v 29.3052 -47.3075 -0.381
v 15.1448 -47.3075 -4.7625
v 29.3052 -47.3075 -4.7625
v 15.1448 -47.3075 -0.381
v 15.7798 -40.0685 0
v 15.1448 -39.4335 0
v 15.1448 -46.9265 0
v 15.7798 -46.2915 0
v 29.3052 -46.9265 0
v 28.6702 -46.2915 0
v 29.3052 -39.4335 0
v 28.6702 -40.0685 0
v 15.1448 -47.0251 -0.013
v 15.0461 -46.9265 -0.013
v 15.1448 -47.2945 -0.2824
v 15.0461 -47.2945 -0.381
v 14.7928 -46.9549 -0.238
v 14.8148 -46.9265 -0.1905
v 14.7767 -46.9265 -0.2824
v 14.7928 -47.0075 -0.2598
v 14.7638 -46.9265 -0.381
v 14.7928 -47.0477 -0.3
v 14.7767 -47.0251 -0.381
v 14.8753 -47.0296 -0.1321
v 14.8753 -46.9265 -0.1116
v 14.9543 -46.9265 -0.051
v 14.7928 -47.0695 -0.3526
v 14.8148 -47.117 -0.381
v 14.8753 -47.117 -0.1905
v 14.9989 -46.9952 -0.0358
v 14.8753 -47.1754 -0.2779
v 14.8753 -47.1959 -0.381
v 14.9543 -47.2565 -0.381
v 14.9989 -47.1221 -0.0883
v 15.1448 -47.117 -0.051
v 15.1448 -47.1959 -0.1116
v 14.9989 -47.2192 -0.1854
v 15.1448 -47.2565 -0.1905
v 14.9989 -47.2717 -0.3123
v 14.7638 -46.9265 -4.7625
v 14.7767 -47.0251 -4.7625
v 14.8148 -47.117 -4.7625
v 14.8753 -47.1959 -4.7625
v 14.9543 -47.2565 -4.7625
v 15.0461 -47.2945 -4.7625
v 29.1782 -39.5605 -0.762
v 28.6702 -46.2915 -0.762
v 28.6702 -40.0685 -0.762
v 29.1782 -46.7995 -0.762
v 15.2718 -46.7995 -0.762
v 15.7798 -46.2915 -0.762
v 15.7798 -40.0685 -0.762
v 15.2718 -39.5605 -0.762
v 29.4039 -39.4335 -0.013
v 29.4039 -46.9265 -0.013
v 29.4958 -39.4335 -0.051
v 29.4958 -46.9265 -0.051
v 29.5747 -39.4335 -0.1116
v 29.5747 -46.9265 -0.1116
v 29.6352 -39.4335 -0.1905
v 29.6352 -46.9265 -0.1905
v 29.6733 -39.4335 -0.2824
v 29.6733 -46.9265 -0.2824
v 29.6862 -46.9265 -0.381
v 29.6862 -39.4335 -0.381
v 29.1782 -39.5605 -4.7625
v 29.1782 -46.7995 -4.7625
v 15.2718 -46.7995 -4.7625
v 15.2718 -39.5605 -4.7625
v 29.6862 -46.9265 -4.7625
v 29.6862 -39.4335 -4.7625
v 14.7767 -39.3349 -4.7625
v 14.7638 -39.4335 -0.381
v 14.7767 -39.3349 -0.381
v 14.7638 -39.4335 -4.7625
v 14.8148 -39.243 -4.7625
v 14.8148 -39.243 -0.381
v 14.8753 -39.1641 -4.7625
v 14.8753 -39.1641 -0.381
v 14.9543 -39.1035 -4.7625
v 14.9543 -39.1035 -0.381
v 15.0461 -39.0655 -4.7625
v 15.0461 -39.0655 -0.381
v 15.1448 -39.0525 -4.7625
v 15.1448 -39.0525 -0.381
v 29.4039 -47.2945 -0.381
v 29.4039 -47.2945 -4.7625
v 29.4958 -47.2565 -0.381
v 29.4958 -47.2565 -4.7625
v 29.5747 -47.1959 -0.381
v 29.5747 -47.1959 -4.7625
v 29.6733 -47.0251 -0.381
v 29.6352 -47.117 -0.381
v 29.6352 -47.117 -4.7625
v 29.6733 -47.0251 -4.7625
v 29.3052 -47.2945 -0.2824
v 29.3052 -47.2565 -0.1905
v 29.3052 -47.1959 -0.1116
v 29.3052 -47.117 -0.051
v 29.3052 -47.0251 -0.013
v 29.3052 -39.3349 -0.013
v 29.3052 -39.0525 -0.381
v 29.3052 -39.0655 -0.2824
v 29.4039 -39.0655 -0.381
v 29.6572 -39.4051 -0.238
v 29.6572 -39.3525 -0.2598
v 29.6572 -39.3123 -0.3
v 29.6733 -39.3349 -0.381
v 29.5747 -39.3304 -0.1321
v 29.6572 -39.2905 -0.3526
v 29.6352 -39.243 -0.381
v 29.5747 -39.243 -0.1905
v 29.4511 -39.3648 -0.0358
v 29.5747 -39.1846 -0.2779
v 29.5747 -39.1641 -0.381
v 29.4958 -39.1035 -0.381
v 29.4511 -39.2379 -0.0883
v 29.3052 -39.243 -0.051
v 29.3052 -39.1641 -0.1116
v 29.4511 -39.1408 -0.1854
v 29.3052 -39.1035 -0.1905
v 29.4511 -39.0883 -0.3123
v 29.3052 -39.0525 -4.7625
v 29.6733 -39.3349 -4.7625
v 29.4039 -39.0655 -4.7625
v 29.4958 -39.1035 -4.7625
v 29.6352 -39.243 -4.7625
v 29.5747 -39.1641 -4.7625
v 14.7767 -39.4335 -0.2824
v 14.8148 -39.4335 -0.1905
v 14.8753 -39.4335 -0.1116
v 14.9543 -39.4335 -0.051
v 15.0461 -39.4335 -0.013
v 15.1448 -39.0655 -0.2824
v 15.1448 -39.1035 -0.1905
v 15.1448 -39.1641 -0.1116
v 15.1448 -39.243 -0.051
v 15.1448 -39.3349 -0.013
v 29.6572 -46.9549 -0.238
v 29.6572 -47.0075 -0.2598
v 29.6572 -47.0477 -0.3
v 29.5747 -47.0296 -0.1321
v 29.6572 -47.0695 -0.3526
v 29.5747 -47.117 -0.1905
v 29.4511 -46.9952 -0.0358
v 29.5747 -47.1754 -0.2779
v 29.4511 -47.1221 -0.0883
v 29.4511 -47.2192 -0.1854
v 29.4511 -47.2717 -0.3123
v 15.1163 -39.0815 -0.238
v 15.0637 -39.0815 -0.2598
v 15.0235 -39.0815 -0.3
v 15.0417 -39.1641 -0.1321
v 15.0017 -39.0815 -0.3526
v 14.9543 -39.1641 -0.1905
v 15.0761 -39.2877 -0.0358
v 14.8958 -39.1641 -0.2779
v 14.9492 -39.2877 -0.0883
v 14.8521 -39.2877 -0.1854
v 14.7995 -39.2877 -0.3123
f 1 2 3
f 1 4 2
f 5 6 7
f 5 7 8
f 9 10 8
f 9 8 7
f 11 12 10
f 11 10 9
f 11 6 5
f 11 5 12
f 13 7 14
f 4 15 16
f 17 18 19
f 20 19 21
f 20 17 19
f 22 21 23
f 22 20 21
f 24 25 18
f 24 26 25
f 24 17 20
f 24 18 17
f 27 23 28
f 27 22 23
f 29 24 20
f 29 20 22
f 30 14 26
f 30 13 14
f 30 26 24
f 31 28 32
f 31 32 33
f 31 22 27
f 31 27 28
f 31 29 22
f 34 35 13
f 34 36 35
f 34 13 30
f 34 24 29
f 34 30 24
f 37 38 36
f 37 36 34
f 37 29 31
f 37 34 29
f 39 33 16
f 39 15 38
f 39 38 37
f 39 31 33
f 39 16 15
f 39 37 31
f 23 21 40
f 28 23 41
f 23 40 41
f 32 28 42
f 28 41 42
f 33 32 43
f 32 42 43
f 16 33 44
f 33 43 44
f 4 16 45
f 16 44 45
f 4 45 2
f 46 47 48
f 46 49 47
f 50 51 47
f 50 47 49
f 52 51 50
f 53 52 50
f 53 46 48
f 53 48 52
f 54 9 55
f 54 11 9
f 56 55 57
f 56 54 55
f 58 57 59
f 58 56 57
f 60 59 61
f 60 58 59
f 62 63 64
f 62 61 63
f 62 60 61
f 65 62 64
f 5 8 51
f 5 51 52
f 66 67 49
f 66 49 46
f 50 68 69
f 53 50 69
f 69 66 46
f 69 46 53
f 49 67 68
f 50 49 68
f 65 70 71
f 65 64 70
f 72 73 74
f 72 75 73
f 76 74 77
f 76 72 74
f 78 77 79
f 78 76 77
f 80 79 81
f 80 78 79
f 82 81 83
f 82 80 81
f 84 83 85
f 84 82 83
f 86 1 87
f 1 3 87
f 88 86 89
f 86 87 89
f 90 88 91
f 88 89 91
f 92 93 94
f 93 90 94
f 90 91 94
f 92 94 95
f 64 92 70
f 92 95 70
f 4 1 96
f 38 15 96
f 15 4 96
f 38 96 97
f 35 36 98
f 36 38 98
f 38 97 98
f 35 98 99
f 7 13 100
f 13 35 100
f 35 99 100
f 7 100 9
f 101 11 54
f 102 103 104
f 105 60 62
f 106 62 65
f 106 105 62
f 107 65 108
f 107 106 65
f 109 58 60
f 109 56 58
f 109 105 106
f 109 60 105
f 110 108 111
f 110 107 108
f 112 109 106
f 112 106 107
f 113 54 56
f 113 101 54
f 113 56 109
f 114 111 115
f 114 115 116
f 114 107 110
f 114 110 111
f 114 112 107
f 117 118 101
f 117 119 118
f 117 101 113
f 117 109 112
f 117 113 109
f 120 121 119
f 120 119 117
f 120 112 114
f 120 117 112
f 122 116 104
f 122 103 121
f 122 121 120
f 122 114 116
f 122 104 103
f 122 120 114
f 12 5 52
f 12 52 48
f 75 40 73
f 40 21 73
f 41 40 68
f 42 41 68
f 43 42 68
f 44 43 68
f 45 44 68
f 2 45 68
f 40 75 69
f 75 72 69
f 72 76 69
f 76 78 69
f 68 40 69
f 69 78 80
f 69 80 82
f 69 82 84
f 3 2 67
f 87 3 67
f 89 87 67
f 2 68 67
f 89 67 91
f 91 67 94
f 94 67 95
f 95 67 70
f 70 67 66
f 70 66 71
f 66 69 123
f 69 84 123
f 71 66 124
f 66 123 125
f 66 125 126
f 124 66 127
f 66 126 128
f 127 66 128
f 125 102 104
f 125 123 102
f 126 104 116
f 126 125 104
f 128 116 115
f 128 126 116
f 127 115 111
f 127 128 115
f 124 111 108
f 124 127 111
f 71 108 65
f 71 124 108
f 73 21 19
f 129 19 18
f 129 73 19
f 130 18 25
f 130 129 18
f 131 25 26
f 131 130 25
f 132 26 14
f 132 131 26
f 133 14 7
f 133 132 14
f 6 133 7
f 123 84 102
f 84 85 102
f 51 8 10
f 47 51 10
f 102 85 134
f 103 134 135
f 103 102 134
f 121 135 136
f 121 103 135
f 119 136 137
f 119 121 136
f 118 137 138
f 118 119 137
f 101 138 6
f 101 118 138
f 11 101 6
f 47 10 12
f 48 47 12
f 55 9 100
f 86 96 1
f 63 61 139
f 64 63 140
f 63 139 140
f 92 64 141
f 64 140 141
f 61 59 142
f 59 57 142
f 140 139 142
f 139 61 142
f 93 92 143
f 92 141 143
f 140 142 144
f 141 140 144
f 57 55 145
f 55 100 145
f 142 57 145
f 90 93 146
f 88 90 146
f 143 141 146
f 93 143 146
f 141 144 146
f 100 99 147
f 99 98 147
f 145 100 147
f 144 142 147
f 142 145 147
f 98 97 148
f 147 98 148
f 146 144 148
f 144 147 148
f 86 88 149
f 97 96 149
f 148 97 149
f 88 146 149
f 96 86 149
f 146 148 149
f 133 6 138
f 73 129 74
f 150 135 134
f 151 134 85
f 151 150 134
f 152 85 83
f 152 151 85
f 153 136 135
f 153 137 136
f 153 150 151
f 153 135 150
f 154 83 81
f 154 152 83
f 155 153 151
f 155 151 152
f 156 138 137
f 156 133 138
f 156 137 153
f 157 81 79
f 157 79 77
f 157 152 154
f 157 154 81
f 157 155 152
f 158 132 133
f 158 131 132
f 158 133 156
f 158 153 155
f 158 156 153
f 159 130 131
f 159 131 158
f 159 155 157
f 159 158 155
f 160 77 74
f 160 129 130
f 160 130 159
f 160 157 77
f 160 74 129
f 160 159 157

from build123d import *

# Parameters (mm, degrees)
SKETCH1_W           = 14.9225
SKETCH1_H           = 8.255
SKETCH1_W_2         = 12.8905
SKETCH1_H_2         = 6.223
BOSS_EXTRUDE1_DEPTH = 4.7625
SKETCH2_W           = 13.9065
SKETCH2_H           = 7.239
CUT_EXTRUDE1_DEPTH  = 4.0005
FILLET1_R           = 0.381


with BuildPart() as part:
    # Sketch1 → Boss-Extrude1 (new body)
    with BuildSketch(Plane.XY):
        with Locations((22.225, -43.18)):
            Rectangle(SKETCH1_W, SKETCH1_H)
        with Locations((22.225, -43.18)):
            Rectangle(SKETCH1_W_2, SKETCH1_H_2, mode=Mode.SUBTRACT)
    extrude(amount=-BOSS_EXTRUDE1_DEPTH)

    # Sketch2 → Cut-Extrude1 (cut)
    with BuildSketch(Plane(origin=(0, 0, -4.7625), x_dir=(-1, 0, 0), z_dir=(0, 0, -1))):
        with Locations((-22.225, -43.18)):
            Rectangle(SKETCH2_W, SKETCH2_H)
    extrude(amount=-CUT_EXTRUDE1_DEPTH, mode=Mode.SUBTRACT)

    # Fillet1
    fillet1_edges = [part.edges().sort_by_distance(p)[0] for p in [
        (22.225, -47.3075, 0),
        (14.76375, -43.18, 0),
        (22.225, -39.0525, 0),
        (29.68625, -43.18, 0),
        (29.68625, -47.3075, -2.38125),
        (14.76375, -47.3075, -2.38125),
        (14.76375, -39.0525, -2.38125),
        (29.68625, -39.0525, -2.38125),
    ]]
    fillet(fillet1_edges, radius=FILLET1_R)


solid = part.part
